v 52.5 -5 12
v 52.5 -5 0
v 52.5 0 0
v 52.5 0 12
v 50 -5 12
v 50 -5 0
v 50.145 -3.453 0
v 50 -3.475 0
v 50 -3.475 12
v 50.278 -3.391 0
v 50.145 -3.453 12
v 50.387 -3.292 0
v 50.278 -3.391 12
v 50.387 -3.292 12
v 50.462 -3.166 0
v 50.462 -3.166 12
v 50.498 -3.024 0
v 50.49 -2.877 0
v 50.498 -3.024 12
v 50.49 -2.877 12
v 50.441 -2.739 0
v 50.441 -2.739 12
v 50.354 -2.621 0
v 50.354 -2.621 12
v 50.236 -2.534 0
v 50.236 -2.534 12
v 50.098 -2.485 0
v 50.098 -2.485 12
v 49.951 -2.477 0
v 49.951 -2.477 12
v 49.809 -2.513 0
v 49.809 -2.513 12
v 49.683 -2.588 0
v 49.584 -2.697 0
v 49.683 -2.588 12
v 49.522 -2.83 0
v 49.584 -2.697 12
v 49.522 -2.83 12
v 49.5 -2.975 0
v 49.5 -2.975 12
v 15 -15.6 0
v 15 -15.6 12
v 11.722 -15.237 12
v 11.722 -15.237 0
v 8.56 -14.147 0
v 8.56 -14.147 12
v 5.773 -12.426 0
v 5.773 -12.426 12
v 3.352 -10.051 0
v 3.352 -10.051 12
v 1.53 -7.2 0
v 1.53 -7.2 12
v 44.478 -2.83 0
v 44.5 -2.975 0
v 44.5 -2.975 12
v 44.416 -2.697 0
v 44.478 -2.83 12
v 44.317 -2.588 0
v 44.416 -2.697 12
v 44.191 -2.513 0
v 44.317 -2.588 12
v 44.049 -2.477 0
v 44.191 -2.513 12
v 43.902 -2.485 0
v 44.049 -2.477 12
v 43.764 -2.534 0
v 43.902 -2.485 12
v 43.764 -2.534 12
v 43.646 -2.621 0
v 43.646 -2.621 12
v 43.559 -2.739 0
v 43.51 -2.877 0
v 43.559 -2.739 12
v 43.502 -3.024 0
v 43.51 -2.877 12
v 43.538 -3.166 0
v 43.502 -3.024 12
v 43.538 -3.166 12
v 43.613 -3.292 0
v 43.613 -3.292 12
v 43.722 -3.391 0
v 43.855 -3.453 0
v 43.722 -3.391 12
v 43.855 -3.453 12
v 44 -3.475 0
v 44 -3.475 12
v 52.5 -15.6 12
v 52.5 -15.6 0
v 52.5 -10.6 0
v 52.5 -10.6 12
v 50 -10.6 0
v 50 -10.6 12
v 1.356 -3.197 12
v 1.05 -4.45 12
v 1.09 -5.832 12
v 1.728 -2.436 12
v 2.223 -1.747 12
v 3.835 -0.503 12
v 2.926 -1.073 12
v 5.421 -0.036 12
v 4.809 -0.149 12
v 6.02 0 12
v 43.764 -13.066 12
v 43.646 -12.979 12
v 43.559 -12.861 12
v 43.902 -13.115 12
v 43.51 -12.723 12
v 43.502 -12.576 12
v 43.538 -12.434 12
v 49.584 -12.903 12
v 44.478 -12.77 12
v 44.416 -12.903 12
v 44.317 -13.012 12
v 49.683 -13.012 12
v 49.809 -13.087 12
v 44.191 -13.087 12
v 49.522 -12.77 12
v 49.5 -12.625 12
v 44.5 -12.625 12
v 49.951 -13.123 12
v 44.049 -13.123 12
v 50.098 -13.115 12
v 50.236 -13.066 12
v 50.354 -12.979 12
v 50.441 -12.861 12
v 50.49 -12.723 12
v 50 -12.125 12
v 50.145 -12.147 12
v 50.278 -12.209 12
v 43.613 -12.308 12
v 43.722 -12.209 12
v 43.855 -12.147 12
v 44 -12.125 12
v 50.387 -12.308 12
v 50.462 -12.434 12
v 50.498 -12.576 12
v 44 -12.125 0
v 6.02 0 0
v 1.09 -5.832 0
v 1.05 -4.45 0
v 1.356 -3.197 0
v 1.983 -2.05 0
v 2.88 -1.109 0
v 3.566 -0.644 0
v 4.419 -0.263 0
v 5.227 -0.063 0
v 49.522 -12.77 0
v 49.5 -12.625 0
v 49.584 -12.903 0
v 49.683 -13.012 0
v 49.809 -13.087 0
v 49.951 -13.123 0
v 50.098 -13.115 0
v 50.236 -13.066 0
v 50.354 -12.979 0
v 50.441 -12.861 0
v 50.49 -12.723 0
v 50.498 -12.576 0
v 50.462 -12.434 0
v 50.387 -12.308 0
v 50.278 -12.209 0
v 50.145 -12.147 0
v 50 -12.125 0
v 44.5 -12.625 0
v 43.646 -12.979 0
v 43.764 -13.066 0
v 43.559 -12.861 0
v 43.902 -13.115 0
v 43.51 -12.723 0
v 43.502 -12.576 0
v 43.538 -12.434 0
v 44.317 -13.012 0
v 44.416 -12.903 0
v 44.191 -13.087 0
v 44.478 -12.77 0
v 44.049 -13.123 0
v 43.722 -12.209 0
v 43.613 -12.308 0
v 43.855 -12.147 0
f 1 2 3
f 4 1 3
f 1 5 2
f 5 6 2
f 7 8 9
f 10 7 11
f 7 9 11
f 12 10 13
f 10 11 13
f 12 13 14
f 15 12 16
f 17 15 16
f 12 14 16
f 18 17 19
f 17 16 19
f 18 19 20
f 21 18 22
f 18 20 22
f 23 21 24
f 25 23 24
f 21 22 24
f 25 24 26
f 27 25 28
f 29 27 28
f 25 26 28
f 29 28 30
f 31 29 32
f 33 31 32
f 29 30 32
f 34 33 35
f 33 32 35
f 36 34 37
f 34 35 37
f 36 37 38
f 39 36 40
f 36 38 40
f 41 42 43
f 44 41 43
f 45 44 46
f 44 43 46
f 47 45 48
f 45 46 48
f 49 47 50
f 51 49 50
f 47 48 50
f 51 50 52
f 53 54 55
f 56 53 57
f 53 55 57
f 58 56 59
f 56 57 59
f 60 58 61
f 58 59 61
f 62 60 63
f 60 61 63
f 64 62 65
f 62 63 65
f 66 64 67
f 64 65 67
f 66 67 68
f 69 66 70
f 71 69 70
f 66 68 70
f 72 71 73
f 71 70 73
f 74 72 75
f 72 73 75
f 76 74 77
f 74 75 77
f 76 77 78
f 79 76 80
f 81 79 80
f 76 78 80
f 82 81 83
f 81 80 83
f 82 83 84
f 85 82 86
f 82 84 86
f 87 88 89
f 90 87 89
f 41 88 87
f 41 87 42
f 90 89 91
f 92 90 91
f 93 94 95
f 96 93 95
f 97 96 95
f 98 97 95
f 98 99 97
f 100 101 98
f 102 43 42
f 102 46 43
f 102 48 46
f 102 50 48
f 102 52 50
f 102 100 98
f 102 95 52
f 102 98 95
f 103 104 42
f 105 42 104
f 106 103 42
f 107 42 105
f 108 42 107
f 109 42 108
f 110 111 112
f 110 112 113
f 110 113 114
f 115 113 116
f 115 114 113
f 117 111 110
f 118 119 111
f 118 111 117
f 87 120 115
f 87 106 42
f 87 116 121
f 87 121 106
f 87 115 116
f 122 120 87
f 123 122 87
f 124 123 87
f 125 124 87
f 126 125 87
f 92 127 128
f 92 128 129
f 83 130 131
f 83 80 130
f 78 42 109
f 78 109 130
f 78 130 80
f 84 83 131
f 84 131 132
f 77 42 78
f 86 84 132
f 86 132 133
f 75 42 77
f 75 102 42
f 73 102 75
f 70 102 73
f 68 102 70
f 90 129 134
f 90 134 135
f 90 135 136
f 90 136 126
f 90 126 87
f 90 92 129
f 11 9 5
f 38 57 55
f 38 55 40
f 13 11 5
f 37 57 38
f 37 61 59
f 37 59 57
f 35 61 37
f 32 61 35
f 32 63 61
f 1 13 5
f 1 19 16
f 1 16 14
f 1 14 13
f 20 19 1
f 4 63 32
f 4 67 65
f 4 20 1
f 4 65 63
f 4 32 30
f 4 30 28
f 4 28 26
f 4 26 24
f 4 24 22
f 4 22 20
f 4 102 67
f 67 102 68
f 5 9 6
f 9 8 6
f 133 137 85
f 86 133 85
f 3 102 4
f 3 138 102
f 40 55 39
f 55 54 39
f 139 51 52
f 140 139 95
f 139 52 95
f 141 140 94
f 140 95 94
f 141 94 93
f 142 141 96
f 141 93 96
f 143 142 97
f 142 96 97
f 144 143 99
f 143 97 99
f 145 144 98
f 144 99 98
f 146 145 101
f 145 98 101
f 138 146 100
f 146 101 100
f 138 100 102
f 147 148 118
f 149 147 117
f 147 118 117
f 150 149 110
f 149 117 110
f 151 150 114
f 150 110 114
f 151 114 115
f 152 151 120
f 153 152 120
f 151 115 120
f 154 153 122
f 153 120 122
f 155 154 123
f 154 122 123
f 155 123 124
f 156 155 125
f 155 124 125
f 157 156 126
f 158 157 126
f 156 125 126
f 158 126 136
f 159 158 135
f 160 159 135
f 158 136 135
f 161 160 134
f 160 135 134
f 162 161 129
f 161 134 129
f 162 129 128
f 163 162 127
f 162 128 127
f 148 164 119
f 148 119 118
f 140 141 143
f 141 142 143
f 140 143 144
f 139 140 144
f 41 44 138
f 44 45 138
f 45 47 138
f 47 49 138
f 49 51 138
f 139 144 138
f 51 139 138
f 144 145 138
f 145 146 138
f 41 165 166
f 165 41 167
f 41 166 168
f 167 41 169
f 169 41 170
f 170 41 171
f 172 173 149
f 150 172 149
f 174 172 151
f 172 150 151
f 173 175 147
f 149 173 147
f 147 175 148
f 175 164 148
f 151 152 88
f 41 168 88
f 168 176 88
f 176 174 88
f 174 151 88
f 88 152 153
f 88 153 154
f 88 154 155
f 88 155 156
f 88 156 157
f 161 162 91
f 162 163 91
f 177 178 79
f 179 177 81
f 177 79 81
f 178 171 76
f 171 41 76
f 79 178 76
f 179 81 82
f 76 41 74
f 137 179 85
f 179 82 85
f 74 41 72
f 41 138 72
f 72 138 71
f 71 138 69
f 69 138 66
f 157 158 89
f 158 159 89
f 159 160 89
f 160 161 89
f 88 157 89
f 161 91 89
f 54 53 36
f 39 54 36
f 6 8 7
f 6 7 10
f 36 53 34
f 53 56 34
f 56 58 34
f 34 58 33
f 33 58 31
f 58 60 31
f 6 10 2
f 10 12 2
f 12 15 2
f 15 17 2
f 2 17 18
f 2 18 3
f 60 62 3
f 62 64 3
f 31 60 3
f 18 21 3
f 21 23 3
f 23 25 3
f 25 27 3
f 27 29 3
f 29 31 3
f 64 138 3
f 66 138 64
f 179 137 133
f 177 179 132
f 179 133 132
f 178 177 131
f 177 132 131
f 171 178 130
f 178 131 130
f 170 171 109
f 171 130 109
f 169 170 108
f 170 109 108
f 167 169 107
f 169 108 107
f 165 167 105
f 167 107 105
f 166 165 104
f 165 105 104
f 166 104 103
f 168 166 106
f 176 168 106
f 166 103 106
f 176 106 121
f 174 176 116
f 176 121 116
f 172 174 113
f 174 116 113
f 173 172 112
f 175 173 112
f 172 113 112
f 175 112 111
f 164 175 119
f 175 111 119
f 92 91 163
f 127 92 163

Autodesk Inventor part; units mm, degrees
ref_plane "YZ Plane" through (0, 0, 0) normal (1, 0, 0) x (0, 1, 0)
ref_plane "XZ Plane" through (0, 0, 0) normal (0, 1, 0) x (-1, 0, 0)
ref_plane "XY Plane" through (0, 0, 0) normal (0, 0, 1) x (1, 0, 0)
sketch "Sketch5" plane through (0, 0, 0) normal (0, 0, 1) x (1, 0, 0)
  line L0 (52.5, -15.6) -> (52.5, -10.6)
  line L1 (52.5, -10.6) -> (50, -10.6)
  line L2 (50, -10.6) -> (50, -12.625)
  line L3 (44, -12.625) -> (44, -2.975)
  line L4 (50, -2.975) -> (50, -5)
  line L5 (50, -5) -> (52.5, -5)
  line L6 (52.5, -5) -> (52.5, 0)
  line L7 (52.5, 0) -> (7.8, 0)
  line L8 (44, -2.975) -> (50, -2.975)
  line L9 (44, -12.625) -> (50, -12.625)
  line L10 (52.5, -15.6) -> (7.8, -15.6)
  line L11 (7.8, -15.6) -> (0, -15.6)
  line L12 (0, -15.6) -> (0, 0)
  line L13 (0, 0) -> (7.8, 0)
  point P0 (7.8, 0)
  dimension "d41" = 6
  dimension "d48" = 44
  dimension "d50" = 2.5
  dimension "d63" = 44.7
  dimension "d71" = 0
  dimension "d87" = 5.6
  dimension "d88" = 9.65
  dimension "d97" = 15.6
extrude "Extrusion2" add sketch "Sketch5" along normal blind 12
fillet "Fillet2" radius 15 1 edges at (0, -15.6, 6)
sketch "Sketch11" plane through (0, 0, 12) normal (0, 0, 1) x (1, 0, 0)
  line L0 (44, -2.975) -> (50, -2.975) projected
  circle A0 centre (44, -2.975) radius 0.5
  line L1 (44, -12.625) -> (44, -2.975) projected
  circle A1 centre (44, -12.625) radius 0.5
  line L2 (50, -12.625) -> (44, -12.625) projected
  circle A2 centre (50, -12.625) radius 0.5
  line L3 (50, -2.975) -> (50, -5) projected
  circle A3 centre (50, -2.975) radius 0.5
  point P0 (0, 0)
  dimension "d99" = 1
  dimension "d100" = 1
  dimension "d101" = 1
  dimension "d102" = 1
extrude "Extrusion7" cut sketch "Sketch11" against normal through all
fillet "Rundung3" radius 5 1 edges at (0, 0, 6)
equation "\"l1\" = 8"
properties part number "Maria_Greifer_3D-Druck"
